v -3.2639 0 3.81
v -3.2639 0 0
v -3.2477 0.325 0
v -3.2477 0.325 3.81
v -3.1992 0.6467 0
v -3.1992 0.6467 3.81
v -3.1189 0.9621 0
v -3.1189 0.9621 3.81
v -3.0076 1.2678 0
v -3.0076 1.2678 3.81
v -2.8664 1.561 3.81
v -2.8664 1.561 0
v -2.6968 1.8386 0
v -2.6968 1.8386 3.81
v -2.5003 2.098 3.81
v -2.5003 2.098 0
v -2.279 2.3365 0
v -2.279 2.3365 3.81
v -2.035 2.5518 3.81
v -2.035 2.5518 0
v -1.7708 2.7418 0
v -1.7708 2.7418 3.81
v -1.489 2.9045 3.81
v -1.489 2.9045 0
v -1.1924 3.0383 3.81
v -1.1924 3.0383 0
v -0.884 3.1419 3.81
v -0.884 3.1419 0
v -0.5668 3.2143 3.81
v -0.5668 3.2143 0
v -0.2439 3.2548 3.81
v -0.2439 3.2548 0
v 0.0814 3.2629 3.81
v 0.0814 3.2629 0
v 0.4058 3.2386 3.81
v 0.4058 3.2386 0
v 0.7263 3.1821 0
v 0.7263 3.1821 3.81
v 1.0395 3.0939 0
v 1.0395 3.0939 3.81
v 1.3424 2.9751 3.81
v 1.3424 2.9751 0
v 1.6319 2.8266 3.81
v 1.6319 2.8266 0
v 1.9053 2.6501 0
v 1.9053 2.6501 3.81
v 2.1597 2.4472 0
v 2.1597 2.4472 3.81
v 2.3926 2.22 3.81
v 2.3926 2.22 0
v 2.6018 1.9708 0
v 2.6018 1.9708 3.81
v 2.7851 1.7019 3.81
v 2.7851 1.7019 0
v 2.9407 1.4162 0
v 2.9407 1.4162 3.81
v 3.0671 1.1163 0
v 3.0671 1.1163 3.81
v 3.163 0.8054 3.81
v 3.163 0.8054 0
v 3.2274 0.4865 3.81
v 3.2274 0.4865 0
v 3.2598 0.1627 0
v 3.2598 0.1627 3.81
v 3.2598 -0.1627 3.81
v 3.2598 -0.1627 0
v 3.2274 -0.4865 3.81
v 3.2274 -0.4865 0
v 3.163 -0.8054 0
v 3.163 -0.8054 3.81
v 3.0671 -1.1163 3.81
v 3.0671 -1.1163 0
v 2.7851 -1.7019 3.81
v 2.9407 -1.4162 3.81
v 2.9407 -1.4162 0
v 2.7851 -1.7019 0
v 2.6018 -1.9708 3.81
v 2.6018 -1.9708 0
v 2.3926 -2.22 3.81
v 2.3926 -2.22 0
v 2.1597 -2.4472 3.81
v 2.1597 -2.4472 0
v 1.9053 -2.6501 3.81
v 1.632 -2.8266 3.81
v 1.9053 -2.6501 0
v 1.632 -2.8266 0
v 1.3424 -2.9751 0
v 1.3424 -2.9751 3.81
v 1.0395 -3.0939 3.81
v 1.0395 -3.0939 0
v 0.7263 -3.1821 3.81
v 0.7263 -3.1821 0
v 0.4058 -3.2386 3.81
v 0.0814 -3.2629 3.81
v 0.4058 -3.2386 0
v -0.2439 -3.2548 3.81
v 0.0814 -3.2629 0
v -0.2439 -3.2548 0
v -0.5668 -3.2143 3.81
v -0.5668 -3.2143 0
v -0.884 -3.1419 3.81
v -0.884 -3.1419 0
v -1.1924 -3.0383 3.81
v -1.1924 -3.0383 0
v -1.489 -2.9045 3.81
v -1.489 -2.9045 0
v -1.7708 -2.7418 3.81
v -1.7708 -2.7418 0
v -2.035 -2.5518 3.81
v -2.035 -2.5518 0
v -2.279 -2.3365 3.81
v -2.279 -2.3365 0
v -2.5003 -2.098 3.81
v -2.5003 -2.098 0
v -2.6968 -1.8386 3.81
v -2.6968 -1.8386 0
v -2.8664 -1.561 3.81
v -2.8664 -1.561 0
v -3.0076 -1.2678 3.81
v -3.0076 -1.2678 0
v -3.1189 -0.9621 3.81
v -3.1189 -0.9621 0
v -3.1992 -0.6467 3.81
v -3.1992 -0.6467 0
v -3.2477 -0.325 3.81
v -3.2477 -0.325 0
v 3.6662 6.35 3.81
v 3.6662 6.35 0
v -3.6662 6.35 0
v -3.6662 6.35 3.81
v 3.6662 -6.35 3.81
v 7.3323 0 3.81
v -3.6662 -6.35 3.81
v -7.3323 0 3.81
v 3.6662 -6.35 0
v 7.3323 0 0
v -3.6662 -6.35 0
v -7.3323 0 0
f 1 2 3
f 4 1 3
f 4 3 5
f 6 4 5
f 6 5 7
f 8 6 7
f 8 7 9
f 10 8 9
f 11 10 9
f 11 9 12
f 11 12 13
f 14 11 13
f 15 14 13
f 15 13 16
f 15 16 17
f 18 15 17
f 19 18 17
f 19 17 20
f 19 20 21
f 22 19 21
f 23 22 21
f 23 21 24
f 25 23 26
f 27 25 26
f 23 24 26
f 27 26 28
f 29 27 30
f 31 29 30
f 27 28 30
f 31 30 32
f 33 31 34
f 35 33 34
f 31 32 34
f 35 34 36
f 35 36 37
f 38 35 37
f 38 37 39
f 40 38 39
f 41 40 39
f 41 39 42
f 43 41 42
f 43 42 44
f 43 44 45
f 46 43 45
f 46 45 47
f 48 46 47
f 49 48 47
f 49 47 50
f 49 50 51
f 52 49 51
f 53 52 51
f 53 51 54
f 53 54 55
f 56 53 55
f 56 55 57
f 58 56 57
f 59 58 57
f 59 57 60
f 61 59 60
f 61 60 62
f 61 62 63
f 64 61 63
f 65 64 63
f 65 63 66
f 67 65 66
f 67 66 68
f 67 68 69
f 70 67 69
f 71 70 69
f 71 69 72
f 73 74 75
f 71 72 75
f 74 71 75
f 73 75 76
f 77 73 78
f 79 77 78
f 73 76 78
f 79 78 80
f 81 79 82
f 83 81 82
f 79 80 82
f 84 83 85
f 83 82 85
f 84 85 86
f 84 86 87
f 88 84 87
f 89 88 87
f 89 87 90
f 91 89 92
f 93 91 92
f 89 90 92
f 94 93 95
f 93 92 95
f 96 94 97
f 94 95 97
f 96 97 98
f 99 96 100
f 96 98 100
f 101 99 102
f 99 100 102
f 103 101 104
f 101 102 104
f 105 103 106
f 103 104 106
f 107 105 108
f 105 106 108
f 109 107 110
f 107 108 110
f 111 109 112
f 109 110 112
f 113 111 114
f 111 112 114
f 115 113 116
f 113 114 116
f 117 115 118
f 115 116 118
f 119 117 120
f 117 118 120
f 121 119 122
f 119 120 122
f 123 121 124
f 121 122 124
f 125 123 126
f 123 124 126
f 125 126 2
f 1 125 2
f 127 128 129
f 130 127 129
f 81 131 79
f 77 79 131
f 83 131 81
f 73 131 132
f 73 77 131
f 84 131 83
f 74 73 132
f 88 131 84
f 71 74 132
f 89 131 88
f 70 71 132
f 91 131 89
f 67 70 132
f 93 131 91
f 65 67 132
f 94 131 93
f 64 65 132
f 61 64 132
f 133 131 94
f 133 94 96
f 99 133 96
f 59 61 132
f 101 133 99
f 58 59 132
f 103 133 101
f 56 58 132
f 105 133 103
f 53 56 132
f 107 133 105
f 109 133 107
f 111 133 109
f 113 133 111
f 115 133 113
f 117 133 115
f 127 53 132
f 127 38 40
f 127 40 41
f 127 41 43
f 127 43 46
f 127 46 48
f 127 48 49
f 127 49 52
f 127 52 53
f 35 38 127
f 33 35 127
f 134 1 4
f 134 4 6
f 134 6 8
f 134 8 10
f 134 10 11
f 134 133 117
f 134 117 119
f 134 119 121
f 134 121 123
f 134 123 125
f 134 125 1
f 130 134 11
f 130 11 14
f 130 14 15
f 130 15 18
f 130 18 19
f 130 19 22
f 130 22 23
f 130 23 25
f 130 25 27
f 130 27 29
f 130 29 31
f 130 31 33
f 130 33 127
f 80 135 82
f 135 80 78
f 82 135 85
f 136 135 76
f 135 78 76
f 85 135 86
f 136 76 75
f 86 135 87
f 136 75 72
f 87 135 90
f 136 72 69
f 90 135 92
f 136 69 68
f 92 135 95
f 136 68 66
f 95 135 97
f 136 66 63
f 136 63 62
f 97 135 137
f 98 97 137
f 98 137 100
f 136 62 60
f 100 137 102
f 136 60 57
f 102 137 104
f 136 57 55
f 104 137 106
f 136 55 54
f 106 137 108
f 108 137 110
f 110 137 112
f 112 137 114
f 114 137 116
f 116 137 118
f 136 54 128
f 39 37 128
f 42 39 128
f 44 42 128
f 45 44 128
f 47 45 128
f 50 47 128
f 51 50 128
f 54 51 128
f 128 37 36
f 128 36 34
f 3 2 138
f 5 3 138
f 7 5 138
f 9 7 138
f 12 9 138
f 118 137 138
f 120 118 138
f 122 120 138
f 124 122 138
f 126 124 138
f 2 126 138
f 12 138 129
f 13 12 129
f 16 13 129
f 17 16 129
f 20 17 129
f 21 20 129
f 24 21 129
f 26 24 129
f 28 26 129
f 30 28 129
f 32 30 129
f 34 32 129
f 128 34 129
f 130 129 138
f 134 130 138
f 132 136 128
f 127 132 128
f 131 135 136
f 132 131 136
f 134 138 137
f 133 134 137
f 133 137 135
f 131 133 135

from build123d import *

# Parameters (mm, degrees)
BOSS_EXTRUDE1_DEPTH              = 3.81
TAP_DRILL_FOR_5_16_18_TAP1_D     = 6.5278
TAP_DRILL_FOR_5_16_18_TAP1_DEPTH = 25.4
TAP_DRILL_FOR_5_16_18_TAP1_TIP   = 1.961148974


with BuildPart() as part:
    # Sketch1 → Boss-Extrude1 (new body)
    with BuildSketch(Plane(origin=(0, 0, 0), x_dir=(0, 1, 0), z_dir=(0, 0, 1))):
        Polygon((0, -7.332348419), (6.35, -3.666174209), (6.35, 3.666174209), (0, 7.332348419), (-6.35, 3.666174209), (-6.35, -3.666174209), align=None)
    extrude(amount=BOSS_EXTRUDE1_DEPTH)

    # Tap Drill for 5/16-18 Tap1
    with Locations(Plane.XY.offset(3.81)):
        with Locations((0, 0)):
            Hole(TAP_DRILL_FOR_5_16_18_TAP1_D / 2, depth=TAP_DRILL_FOR_5_16_18_TAP1_DEPTH)
            with Locations((0, 0, -(TAP_DRILL_FOR_5_16_18_TAP1_DEPTH + TAP_DRILL_FOR_5_16_18_TAP1_TIP / 2))):  # 118° drill point
                Cone(0, TAP_DRILL_FOR_5_16_18_TAP1_D / 2, TAP_DRILL_FOR_5_16_18_TAP1_TIP, mode=Mode.SUBTRACT)


solid = part.part
